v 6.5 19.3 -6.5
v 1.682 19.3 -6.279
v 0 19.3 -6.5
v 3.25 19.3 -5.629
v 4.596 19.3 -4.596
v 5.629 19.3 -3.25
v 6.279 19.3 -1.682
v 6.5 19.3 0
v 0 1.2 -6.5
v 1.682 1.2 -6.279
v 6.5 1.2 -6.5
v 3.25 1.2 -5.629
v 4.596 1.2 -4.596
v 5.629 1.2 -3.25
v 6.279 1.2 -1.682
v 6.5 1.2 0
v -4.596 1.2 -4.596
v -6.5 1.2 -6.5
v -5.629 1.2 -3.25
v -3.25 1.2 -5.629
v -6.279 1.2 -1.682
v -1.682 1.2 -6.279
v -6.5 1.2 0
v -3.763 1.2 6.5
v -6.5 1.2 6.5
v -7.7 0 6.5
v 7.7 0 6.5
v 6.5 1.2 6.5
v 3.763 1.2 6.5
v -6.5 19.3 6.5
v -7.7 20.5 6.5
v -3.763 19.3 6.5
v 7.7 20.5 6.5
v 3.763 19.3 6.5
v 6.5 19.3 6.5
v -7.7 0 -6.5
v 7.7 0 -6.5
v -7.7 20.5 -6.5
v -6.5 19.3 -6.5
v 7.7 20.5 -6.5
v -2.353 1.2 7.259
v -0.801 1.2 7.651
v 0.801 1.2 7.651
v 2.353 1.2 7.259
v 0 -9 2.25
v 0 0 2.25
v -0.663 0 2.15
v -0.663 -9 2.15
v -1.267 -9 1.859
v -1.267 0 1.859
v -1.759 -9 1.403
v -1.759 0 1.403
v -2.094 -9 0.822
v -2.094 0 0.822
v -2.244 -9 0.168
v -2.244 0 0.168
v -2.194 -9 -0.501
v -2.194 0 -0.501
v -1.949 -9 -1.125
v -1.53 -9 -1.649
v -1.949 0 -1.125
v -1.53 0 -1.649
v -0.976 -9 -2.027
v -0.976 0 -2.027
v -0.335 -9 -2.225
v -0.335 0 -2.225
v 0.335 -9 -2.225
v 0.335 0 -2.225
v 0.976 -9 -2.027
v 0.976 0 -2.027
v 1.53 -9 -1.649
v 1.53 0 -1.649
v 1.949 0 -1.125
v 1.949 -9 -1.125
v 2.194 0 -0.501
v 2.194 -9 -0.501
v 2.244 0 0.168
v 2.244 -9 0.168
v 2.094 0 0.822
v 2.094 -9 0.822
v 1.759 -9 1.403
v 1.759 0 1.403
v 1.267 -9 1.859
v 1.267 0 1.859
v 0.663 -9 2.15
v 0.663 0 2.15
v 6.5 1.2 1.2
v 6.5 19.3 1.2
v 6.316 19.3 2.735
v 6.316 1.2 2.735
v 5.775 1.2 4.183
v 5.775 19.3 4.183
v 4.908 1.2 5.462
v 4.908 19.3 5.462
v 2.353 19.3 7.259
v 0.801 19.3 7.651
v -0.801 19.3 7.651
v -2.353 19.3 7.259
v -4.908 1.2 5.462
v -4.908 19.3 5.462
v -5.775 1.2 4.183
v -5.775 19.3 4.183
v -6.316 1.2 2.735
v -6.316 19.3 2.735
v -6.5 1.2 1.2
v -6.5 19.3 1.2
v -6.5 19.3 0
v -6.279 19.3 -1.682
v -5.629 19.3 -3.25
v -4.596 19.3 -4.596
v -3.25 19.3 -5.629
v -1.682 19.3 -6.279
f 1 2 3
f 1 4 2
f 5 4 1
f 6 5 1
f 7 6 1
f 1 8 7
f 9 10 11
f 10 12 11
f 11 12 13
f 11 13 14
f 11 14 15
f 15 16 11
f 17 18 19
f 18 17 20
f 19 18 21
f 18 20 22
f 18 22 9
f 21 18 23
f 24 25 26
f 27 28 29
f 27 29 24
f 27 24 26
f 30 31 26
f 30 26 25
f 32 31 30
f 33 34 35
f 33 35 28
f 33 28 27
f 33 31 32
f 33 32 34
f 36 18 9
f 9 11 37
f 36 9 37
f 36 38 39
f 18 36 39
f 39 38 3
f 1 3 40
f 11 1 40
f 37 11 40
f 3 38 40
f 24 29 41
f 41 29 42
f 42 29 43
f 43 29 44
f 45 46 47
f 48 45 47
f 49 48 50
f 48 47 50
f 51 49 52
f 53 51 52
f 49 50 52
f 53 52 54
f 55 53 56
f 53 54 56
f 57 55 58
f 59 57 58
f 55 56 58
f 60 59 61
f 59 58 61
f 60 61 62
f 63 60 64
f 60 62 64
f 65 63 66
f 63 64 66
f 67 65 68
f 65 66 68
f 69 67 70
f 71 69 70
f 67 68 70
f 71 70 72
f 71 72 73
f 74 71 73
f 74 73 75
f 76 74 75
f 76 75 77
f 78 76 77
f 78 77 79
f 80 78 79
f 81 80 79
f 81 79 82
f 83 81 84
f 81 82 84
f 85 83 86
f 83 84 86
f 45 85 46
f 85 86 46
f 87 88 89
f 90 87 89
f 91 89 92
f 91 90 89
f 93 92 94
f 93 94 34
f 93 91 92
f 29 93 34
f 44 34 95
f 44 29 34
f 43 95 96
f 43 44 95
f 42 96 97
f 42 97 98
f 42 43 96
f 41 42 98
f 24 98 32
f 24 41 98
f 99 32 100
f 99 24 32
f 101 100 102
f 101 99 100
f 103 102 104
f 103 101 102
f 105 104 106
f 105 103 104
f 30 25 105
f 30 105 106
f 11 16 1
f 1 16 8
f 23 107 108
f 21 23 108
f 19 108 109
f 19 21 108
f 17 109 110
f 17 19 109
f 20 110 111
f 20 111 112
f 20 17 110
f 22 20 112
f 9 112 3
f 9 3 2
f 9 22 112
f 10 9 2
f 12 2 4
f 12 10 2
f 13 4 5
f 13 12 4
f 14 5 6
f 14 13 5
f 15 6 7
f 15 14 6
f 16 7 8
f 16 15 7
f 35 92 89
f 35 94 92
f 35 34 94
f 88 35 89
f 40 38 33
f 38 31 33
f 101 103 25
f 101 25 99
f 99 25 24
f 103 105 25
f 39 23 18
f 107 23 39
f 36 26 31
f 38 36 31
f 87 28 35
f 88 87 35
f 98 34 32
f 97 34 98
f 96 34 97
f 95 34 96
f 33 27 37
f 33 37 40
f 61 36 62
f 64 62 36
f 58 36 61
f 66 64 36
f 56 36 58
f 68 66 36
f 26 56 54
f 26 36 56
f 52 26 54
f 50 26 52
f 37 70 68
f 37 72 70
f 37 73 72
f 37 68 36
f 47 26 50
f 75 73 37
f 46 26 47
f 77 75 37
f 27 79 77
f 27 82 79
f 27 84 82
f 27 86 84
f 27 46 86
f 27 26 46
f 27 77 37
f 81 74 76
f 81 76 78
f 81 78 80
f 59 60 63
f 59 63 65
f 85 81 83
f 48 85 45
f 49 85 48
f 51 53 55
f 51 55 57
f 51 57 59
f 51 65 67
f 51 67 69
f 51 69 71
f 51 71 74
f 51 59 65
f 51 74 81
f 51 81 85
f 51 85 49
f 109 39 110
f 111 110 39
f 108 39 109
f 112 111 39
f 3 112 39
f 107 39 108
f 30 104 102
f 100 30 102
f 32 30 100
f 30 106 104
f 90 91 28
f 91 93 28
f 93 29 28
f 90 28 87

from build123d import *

# Parameters (mm, degrees)
ESQUISSE1_W        = 15.4
ESQUISSE1_H        = 20.5
ESQUISSE1_W_2      = 13
ESQUISSE1_H_2      = 18.1
BOSS_EXTRU_1_DEPTH = 6.5
ESQUISSE2_R        = 2.25
BOSS_EXTRU_2_DEPTH = 9
BOSS_EXTRU_3_DEPTH = 18.1


with BuildPart() as part:
    # Esquisse1 → Boss.-Extru.1 (new, symmetric)
    with BuildSketch(Plane.XY):
        with Locations((0, 10.25)):
            Rectangle(ESQUISSE1_W, ESQUISSE1_H)
        with Locations((0, 10.25)):
            Rectangle(ESQUISSE1_W_2, ESQUISSE1_H_2, mode=Mode.SUBTRACT)
    extrude(amount=BOSS_EXTRU_1_DEPTH, both=True)

    # Esquisse2 → Boss.-Extru.2 (add)
    with BuildSketch(Plane.XZ):
        with Locations(Location((0, 0, 0), (0, 0, 90))):
            Circle(ESQUISSE2_R)
    extrude(amount=BOSS_EXTRU_2_DEPTH)

    # Esquisse3 → Boss.-Extru.3 (add)
    with BuildSketch(Plane(origin=(0, 1.2, 0), x_dir=(1, 0, 0), z_dir=(0, 1, 0))):
        with BuildLine():
            Line((6.5, 0), (6.5, -1.2))
            ThreePointArc((6.5, -1.2), (0, -7.7), (-6.5, -1.2))
            Line((-6.5, -1.2), (-6.5, 0))
            ThreePointArc((-6.5, 0), (0, 6.5), (6.5, 0))
        make_face()
    extrude(amount=BOSS_EXTRU_3_DEPTH)


solid = part.part
